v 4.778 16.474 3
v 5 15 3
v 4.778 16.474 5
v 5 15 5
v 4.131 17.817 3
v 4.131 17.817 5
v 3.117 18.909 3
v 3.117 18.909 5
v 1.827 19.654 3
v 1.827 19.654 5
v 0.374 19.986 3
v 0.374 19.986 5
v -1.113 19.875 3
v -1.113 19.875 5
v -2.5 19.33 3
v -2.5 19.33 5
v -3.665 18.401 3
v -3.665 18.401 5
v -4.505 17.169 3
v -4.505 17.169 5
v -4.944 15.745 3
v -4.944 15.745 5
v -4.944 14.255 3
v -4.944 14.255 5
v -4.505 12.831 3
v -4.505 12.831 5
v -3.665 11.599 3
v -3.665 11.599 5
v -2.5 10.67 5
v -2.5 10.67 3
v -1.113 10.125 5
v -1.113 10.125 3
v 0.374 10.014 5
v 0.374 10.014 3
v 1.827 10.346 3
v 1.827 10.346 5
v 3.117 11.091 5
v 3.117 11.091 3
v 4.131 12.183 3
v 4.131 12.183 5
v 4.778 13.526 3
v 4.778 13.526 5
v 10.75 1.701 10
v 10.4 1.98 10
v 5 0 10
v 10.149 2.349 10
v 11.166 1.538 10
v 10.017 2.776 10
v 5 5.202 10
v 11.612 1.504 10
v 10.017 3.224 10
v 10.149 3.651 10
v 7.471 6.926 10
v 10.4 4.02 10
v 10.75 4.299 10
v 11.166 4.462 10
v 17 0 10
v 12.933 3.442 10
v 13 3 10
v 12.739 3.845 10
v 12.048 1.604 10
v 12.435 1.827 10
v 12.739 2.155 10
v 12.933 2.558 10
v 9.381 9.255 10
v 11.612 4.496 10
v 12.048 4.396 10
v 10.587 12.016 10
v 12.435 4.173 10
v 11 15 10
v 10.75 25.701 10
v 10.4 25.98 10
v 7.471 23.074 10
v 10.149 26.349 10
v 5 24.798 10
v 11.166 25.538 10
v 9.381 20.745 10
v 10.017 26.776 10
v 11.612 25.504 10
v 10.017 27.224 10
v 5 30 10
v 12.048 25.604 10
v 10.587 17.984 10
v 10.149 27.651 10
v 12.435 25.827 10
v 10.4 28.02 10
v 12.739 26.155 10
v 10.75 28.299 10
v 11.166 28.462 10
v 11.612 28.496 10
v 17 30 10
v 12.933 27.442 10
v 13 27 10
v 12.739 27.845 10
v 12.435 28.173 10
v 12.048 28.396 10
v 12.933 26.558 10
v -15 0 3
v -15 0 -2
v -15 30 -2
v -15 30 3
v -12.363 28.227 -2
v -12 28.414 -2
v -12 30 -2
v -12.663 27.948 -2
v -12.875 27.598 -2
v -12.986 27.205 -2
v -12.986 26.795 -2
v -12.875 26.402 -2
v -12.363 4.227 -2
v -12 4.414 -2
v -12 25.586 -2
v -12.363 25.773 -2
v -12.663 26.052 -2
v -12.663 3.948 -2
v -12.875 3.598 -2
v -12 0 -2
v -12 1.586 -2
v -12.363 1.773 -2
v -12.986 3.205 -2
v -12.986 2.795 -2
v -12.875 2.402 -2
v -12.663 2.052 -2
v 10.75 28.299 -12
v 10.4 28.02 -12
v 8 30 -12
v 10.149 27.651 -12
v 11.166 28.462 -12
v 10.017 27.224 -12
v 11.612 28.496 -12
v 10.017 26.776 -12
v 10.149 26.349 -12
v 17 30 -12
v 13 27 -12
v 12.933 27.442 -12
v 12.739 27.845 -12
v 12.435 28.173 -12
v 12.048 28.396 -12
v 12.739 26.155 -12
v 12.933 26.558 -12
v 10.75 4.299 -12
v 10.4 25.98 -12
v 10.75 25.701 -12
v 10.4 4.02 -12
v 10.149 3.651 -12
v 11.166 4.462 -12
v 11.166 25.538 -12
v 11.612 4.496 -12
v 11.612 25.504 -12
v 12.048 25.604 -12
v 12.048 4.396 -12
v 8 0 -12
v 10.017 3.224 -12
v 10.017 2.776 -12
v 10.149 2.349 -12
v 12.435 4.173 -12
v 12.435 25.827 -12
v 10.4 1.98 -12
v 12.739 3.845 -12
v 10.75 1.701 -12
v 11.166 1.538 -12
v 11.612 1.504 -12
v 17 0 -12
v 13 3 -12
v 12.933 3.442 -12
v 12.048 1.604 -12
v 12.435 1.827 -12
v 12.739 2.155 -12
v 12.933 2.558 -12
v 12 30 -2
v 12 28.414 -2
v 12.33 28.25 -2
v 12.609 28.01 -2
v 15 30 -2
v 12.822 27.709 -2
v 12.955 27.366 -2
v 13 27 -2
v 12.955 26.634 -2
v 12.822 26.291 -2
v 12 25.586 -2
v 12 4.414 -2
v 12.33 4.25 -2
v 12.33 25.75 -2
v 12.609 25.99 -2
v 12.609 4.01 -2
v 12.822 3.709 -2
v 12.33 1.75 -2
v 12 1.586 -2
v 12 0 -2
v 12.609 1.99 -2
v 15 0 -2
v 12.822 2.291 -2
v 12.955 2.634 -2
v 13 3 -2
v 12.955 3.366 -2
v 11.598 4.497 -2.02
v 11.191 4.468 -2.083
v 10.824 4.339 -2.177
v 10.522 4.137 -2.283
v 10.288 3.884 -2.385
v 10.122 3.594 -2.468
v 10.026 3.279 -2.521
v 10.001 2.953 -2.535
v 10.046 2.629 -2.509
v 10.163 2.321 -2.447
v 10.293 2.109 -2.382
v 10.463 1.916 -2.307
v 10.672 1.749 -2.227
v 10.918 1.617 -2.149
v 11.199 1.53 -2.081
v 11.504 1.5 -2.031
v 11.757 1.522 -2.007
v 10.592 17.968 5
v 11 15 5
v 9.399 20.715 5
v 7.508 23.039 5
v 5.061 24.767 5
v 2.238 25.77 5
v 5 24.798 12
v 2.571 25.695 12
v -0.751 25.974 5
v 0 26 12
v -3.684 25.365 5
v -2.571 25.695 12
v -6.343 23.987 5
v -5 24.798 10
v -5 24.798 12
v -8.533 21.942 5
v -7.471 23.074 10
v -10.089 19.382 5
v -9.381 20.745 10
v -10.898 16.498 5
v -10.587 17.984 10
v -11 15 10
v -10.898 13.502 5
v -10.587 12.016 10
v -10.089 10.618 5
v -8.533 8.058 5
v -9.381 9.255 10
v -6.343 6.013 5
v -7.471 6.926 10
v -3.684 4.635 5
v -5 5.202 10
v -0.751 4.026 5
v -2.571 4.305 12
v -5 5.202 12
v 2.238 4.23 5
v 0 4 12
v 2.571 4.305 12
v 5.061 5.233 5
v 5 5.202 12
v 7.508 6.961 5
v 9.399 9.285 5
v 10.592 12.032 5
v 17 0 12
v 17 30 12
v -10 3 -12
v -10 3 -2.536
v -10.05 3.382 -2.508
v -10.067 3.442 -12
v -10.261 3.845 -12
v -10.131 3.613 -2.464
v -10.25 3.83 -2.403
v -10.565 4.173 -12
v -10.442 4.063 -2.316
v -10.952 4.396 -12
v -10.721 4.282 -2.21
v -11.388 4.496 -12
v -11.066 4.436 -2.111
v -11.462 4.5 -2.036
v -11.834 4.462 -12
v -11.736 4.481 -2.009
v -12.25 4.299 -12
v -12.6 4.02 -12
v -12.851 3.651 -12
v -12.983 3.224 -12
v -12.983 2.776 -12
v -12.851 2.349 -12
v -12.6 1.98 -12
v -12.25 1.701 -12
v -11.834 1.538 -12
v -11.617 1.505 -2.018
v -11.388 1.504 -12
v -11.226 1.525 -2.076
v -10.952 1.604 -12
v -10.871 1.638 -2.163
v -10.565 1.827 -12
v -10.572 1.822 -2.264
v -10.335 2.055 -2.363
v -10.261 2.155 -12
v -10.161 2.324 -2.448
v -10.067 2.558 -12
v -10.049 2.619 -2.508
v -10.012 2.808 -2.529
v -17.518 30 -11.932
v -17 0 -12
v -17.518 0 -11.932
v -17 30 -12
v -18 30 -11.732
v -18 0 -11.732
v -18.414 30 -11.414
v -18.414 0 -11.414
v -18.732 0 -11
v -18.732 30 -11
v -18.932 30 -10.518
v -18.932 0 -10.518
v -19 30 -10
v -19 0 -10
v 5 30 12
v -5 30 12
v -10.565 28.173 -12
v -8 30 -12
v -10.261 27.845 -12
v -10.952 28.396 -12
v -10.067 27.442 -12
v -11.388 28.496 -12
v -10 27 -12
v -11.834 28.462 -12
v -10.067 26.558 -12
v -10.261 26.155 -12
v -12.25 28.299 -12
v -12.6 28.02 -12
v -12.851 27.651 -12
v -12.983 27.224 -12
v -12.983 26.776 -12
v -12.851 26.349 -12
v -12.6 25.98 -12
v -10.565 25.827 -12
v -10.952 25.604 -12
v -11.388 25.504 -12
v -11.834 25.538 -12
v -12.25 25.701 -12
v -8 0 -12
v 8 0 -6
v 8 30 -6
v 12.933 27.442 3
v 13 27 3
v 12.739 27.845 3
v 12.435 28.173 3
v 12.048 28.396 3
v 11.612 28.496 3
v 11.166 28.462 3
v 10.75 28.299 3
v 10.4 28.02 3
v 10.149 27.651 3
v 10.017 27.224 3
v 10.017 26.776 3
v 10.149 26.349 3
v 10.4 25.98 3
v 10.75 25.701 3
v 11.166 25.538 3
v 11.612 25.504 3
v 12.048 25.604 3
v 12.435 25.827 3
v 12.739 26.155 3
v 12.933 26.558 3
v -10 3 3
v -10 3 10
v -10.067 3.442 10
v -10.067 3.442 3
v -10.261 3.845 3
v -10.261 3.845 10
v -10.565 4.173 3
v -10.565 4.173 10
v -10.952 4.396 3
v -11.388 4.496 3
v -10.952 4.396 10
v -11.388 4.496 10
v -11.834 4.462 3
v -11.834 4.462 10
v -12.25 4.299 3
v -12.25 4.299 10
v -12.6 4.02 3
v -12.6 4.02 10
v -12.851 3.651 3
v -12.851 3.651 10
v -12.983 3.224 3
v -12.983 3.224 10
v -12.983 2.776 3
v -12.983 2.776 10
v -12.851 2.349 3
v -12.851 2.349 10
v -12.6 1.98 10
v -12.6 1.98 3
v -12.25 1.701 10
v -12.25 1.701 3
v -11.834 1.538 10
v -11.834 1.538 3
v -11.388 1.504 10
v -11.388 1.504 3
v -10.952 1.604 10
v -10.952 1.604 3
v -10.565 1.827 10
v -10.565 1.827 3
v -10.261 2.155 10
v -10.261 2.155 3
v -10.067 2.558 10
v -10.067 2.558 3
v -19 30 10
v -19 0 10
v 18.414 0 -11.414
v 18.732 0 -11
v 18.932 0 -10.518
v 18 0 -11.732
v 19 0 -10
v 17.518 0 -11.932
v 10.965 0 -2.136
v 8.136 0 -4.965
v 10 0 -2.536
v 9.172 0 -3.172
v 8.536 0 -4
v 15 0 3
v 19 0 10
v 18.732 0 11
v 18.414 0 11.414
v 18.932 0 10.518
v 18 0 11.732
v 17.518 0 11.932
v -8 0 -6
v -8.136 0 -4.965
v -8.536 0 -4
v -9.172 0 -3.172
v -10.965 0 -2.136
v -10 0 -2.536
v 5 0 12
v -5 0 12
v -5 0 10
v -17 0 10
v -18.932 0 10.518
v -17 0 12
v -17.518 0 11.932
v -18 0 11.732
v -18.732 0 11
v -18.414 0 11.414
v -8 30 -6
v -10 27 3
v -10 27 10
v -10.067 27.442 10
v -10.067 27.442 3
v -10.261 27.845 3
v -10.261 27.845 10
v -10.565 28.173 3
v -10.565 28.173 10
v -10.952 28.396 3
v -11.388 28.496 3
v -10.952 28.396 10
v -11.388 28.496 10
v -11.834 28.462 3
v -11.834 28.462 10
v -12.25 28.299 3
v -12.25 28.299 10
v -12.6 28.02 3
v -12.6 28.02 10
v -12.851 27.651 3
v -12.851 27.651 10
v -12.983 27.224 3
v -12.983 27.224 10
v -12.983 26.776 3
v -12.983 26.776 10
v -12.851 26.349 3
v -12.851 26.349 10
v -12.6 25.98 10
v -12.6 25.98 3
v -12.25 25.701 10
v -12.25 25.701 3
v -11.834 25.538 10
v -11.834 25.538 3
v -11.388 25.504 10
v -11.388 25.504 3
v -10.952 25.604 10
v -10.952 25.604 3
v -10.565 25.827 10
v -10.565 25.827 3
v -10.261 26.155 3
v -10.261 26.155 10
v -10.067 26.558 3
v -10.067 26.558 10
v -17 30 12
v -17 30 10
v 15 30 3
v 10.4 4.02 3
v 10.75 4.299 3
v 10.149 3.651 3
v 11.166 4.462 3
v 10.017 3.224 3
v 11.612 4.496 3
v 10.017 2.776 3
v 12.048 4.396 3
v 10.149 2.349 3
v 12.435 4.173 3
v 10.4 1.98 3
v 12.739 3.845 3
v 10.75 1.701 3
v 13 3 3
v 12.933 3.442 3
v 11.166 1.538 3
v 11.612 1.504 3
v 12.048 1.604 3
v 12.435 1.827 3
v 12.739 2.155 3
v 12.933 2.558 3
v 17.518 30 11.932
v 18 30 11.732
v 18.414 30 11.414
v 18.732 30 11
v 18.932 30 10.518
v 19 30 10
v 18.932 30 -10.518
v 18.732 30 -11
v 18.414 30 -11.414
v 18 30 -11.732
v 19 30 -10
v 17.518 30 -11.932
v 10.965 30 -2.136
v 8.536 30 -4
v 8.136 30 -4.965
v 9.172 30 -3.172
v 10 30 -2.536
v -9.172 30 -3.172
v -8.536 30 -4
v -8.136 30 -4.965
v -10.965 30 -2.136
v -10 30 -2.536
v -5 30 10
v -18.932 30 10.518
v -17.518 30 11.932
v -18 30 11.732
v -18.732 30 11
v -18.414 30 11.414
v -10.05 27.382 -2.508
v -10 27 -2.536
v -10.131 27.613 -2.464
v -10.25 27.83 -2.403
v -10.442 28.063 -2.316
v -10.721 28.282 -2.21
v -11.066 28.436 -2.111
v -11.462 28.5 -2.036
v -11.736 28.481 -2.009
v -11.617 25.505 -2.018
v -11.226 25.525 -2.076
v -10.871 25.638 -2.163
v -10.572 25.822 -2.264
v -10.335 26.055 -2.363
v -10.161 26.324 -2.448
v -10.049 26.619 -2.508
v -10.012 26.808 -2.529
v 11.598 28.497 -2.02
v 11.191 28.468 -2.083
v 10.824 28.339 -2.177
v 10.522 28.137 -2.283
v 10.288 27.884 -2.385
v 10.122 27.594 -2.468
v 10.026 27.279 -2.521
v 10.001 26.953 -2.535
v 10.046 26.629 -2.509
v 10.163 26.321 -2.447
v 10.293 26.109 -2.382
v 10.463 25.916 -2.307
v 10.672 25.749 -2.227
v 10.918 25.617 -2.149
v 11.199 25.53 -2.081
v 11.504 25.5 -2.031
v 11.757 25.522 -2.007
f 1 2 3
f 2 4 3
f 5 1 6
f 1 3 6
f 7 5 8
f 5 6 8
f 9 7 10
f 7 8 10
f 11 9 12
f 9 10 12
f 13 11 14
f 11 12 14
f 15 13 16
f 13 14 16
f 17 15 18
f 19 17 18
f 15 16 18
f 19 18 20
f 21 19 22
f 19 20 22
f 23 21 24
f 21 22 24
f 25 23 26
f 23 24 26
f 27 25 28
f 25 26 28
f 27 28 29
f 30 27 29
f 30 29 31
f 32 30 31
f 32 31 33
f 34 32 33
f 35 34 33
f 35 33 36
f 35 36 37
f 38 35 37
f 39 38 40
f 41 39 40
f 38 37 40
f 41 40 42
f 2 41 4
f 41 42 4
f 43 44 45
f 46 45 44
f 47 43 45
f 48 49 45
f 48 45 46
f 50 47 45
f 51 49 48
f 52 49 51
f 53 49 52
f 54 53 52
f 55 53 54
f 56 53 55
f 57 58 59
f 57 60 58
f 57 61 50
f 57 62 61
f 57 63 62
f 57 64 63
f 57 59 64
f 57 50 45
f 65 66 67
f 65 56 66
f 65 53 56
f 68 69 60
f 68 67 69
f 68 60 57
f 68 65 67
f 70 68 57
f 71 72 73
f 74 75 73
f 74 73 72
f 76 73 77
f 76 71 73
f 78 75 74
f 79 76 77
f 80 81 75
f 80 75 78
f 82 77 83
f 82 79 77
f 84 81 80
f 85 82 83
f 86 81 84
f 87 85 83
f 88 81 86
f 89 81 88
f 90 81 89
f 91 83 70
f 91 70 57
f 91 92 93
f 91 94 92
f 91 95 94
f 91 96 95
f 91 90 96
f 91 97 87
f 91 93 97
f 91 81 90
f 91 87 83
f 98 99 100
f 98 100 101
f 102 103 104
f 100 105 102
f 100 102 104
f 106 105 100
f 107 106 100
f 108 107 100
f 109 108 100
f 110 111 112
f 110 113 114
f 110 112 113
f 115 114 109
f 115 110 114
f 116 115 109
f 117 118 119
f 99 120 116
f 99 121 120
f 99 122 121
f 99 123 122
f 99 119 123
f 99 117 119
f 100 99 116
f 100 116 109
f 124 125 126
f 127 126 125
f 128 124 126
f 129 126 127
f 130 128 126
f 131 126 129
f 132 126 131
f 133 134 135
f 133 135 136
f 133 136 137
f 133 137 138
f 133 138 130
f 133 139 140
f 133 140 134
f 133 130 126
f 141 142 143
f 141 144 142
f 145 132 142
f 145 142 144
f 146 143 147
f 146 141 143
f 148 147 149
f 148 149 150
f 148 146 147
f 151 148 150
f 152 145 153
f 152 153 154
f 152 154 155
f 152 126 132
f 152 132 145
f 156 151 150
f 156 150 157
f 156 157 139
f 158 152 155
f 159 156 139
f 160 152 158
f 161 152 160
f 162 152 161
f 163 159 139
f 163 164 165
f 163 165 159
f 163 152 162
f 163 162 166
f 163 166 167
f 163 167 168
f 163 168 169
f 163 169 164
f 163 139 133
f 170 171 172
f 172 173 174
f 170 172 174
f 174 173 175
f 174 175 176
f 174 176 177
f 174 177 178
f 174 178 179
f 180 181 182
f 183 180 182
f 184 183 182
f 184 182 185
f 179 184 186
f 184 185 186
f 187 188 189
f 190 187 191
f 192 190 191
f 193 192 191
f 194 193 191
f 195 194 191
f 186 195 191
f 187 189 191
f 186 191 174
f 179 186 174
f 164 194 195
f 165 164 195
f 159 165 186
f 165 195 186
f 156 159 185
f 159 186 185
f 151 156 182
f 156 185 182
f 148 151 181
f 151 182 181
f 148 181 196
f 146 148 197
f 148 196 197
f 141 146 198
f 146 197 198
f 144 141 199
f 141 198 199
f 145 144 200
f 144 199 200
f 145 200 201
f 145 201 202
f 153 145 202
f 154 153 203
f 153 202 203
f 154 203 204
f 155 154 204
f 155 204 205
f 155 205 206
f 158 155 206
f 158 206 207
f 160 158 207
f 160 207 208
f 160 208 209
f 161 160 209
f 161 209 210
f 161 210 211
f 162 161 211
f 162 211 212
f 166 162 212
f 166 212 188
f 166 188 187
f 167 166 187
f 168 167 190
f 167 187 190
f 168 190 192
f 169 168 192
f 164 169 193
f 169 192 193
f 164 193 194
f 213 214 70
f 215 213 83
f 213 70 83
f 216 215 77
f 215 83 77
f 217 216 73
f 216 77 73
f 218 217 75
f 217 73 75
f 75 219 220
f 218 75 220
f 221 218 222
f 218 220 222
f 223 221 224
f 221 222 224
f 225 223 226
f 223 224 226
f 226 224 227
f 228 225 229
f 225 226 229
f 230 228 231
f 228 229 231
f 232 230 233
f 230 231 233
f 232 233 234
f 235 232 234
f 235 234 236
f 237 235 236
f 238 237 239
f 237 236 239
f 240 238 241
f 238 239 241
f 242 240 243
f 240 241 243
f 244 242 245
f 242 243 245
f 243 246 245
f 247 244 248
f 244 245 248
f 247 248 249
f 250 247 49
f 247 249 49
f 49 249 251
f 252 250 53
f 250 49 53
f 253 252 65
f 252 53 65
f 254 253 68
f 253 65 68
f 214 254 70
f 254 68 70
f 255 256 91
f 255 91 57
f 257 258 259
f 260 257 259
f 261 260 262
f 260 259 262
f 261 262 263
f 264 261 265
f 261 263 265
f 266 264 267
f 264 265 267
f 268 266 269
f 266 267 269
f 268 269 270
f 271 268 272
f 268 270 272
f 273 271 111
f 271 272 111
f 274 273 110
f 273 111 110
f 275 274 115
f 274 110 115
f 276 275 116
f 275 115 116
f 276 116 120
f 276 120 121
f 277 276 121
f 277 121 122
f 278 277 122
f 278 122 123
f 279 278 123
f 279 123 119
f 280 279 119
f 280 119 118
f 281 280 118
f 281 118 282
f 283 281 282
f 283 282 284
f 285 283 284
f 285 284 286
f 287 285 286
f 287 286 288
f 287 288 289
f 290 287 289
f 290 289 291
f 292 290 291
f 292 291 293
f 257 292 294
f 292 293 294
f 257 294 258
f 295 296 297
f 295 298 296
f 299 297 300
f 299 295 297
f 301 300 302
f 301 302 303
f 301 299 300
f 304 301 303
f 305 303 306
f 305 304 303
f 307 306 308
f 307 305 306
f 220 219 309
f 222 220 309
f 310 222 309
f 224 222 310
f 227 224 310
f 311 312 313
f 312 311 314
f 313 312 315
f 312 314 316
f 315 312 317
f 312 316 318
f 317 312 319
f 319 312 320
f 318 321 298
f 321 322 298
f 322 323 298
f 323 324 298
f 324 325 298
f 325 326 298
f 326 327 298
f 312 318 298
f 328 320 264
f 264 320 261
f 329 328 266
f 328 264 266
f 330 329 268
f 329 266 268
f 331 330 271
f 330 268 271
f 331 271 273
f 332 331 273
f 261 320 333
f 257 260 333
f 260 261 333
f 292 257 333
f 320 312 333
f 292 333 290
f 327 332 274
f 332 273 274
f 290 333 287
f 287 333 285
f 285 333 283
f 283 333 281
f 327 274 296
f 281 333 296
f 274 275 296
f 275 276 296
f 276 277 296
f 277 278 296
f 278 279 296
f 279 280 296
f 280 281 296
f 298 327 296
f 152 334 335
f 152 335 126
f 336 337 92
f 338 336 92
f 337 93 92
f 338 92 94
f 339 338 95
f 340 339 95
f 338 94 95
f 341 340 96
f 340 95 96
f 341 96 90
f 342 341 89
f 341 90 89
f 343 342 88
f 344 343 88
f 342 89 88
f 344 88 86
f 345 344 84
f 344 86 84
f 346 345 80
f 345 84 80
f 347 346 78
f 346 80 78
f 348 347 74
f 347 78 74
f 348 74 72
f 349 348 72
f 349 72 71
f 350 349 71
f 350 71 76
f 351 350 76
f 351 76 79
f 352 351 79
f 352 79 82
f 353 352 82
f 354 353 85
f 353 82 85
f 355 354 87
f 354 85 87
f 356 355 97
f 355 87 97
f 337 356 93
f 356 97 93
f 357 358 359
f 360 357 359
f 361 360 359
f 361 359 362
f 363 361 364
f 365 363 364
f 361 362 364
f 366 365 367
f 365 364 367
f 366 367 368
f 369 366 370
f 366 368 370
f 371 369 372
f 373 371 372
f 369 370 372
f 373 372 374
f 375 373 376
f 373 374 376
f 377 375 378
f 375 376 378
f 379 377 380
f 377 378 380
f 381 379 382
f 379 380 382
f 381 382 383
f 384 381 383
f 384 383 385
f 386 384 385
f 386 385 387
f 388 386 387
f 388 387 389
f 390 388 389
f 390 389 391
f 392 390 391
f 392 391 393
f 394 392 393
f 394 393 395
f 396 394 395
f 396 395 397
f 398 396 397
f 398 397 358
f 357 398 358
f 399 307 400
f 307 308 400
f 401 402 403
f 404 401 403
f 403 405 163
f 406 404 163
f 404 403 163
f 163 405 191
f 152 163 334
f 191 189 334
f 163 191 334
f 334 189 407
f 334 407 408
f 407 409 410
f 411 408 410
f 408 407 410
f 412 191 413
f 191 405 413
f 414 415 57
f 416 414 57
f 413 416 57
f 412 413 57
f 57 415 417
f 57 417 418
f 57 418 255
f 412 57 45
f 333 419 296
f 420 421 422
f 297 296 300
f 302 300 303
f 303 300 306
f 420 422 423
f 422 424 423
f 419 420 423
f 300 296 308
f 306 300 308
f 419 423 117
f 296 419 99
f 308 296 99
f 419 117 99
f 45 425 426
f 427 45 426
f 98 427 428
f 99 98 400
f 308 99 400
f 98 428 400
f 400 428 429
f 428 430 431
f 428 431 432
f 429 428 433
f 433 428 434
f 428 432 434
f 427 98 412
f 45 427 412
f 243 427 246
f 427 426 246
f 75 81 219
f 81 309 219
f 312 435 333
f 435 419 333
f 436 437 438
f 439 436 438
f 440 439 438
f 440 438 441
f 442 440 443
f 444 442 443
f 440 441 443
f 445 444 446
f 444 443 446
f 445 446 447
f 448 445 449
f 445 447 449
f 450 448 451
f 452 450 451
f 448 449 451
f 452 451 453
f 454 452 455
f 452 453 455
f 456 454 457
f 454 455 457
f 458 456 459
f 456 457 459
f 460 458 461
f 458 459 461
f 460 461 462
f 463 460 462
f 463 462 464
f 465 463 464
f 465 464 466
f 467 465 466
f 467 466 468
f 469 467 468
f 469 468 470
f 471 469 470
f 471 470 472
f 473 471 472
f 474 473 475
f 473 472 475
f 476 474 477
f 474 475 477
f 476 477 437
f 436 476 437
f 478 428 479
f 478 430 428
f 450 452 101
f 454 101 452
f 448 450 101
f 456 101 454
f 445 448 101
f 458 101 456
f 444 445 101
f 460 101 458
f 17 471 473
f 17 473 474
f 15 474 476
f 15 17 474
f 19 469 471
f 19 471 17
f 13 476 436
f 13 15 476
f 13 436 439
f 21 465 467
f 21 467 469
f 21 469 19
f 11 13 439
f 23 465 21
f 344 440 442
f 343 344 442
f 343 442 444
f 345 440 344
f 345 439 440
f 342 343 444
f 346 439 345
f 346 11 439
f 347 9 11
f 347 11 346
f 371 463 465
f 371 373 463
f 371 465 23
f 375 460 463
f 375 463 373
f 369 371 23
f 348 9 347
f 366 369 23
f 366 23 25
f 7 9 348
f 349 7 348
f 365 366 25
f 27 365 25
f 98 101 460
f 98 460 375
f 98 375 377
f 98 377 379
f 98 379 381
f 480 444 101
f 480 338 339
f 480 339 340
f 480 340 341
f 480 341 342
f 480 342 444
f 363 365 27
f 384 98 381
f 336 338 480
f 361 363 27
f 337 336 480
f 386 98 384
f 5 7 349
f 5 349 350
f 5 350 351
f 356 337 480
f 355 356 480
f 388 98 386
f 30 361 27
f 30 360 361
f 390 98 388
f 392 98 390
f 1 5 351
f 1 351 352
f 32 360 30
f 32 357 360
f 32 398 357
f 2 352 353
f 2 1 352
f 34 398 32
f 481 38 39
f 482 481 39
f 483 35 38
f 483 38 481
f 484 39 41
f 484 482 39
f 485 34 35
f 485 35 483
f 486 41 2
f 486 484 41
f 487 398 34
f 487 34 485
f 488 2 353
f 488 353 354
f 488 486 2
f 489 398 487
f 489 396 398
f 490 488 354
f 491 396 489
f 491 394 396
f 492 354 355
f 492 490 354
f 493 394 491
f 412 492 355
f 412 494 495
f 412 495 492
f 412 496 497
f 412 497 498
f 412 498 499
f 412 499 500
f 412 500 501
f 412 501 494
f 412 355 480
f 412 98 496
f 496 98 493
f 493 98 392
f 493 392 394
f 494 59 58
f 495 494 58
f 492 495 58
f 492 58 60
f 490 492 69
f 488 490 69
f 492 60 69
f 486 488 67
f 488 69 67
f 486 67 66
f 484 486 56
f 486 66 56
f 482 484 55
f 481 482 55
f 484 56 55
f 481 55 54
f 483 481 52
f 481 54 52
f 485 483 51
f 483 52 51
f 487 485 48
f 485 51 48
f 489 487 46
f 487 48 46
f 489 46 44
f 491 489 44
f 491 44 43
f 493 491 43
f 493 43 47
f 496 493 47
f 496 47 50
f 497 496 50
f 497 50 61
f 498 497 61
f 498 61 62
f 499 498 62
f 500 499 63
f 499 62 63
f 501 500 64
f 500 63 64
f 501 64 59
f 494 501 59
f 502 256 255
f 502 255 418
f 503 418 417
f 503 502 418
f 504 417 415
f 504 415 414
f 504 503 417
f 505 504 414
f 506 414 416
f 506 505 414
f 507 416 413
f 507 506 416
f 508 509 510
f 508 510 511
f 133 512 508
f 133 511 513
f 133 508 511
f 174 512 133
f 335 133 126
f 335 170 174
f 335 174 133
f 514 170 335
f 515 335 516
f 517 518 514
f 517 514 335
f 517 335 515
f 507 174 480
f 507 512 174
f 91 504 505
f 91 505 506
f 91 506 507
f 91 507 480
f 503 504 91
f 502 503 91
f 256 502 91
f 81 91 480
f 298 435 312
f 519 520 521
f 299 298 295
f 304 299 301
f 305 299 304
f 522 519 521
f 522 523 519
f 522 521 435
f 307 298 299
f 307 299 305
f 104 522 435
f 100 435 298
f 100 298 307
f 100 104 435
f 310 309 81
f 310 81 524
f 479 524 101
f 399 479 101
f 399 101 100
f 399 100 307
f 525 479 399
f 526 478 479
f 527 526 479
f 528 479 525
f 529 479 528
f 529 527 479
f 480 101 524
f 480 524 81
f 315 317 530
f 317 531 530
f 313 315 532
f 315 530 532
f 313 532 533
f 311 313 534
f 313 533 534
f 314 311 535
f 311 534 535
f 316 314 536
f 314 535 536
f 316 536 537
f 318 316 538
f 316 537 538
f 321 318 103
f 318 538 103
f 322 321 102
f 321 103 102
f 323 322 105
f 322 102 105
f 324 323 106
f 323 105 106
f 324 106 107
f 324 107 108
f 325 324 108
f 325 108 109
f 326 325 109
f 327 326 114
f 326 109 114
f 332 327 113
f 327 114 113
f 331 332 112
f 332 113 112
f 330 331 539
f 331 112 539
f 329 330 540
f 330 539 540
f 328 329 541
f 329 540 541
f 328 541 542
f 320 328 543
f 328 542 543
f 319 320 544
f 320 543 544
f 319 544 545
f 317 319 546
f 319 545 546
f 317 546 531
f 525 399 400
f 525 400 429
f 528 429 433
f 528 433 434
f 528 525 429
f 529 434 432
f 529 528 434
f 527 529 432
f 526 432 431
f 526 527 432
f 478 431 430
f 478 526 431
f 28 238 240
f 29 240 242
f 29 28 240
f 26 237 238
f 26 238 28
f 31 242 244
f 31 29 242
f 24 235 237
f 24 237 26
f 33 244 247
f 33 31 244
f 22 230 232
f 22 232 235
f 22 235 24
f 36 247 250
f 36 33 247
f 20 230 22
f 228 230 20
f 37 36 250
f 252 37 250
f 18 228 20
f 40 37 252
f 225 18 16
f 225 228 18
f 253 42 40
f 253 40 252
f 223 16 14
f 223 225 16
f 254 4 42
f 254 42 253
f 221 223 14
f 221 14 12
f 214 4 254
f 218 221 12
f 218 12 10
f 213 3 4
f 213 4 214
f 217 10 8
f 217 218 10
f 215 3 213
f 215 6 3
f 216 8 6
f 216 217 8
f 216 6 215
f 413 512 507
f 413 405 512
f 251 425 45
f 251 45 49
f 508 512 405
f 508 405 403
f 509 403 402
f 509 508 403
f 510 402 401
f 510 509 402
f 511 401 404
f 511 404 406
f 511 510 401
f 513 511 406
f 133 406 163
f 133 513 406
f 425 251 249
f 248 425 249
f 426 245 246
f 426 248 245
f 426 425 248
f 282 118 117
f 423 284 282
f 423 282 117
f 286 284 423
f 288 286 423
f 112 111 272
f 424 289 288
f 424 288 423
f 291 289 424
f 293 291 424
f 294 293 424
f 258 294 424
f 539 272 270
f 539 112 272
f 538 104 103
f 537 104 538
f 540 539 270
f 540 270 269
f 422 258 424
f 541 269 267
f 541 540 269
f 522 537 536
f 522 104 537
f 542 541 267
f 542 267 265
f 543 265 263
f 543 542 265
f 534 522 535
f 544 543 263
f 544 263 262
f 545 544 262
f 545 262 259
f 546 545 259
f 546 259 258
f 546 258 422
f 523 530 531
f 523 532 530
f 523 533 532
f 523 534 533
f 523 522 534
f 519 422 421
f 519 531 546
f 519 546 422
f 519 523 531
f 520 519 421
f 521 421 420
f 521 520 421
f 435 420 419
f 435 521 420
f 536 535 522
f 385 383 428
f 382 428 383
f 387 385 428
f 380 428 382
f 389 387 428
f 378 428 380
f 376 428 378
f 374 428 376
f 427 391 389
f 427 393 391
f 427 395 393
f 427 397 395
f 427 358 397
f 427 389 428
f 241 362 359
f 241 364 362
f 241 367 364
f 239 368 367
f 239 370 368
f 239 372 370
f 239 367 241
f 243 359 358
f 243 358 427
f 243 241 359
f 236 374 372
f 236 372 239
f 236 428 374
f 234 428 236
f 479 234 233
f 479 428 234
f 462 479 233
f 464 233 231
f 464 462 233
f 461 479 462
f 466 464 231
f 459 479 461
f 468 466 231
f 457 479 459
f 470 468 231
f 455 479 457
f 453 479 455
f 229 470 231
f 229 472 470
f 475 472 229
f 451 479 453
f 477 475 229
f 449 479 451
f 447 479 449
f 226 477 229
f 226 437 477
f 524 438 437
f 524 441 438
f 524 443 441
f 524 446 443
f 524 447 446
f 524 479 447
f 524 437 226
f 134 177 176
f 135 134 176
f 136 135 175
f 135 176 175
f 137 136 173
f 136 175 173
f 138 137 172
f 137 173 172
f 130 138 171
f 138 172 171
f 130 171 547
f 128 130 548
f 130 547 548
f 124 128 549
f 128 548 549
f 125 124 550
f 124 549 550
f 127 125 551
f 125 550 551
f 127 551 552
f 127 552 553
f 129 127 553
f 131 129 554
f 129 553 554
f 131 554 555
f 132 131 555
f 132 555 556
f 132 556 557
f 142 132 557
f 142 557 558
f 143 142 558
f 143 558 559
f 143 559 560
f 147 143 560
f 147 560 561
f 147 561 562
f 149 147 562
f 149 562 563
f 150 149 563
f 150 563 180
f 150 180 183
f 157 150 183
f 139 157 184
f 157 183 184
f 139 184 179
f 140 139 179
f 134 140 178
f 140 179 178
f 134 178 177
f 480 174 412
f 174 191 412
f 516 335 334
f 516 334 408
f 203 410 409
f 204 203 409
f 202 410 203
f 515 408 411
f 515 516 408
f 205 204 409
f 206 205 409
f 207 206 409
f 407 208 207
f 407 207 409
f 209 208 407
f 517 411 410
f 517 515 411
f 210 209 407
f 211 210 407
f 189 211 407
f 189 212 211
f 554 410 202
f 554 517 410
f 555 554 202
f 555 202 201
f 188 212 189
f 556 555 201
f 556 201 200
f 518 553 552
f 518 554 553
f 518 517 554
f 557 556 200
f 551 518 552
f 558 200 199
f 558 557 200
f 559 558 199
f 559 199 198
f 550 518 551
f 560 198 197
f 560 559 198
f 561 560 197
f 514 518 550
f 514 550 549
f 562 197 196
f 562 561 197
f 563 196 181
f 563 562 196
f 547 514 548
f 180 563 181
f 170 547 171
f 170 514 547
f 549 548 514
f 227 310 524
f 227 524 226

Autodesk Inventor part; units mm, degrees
ref_plane "YZ Plane" through (0, 0, 0) normal (1, 0, 0) x (0, 1, 0)
ref_plane "XZ Plane" through (0, 0, 0) normal (0, 1, 0) x (-1, 0, 0)
ref_plane "XY Plane" through (0, 0, 0) normal (0, 0, 1) x (1, 0, 0)
sketch "Sketch1" plane through (0, 0, 0) normal (0, 1, 0) x (-1, 0, 0)
  line L0 (0, -37.4557) -> (0, 23.9689) construction
  line L1 (8, -2) -> (8, -12)
  line L2 (8, -12) -> (19, -12)
  line L3 (19, -12) -> (19, 12)
  line L4 (19, 12) -> (2, 12)
  line L5 (8, -2) -> (15, -2)
  line L6 (15, -2) -> (15, 3)
  line L7 (15, 3) -> (0, 3)
  line L8 (0, -49.7407) -> (0, 36.2538) projected
  line L9 (-8, -2) -> (-8, -12)
  line L10 (-8, -12) -> (-19, -12)
  line L11 (-19, -12) -> (-19, 12)
  line L12 (-19, 12) -> (2, 12)
  line L13 (-8, -2) -> (-15, -2)
  line L14 (-15, -2) -> (-15, 3)
  line L15 (-15, 3) -> (0, 3)
  line L16 (26.6, 0) -> (-26.6, 0) projected
  point P0 (19, 0)
  point P1 (-19, 0)
  dimension "d12" = 15
  dimension "d13" = 5
  dimension "d14" = 7
  dimension "d15" = 10
  dimension "d16" = 11
  dimension "d18" = 9
  dimension "d19" = 17
extrude "Extrusion1" add sketch "Sketch1" along normal blind 30 contours L5 L6 L16 L3 L2 L1 | L6 L7 L8 L12 L4 L3 L16 | L15 L14 L16 L11 L12 L8 | L14 L13 L9 L10 L11 L16
fillet "Fillet1" radius 4 2 edges at (-8, 15, -2) (8, 15, -2)
sketch "Sketch2" plane through (-19, 0, 12) normal (0, 0, 1) x (1, 0, 0)
  line L0 (0, 0) -> (38, 0) projected
  line L1 (38, 0) -> (38, 30) projected
  line L2 (0, 30) -> (38, 30) projected
  line L3 (0, 0) -> (0, 30) projected
  line L4 (38, 0) -> (38, 30) projected
  line L5 (38, 15) -> (0, 15) construction
  line L6 (0, 0) -> (0, 30) projected
  circle A0 centre (19, 15) radius 11
  circle A1 centre (19, 15) radius 5
  line L7 (0, 0) -> (38, 0) projected
  line L8 (7, 30) -> (7, 0) projected
  line L9 (4, 30) -> (7, 30) projected
  line L10 (4, 0) -> (4, 30) projected
  line L11 (4, 0) -> (7, 0) projected
  line L12 (31, 0) -> (31, 30) projected
  line L13 (31, 0) -> (34, 0) projected
  line L14 (34, 0) -> (34, 30) projected
  line L15 (31, 30) -> (34, 30) projected
  circle A2 centre (30.5, 27) radius 1.5
  line L16 (19, 15) -> (19, 38.5815) construction
  circle A3 centre (7.5, 27) radius 1.5
  circle A4 centre (30.5, 3) radius 1.5
  circle A5 centre (7.5, 3) radius 1.5
  point P0 (19, 0)
  dimension "d23" = 22
  dimension "d24" = 10
  dimension "d25" = 3
  dimension "d26" = 11.5
  dimension "d27" = 12
extrude "Extrusion2" cut sketch "Sketch2" against normal blind 7 contours A0
extrude "Extrusion3" cut sketch "Sketch2" against normal through all contours A5 L8 | L8 A5 | A4 L12 | L12 A4 | A3 L8 | L8 A3 | A2 L12 | L12 A2 | A1
fillet "Fillet2" radius 2 4 edges at (19, 15, 12) (-19, 15, 12) (-19, 15, -12) (19, 15, -12)
sketch "Boceto4" plane through (-17, 0, 12) normal (0, 0, 1) x (1, 0, 0)
  circle A0 centre (17, 15) radius 5 projected
  line L0 (0, 0) -> (0, 30) projected
  line L1 (34, 30) -> (34, 0) projected
  line L2 (0, 0) -> (34, 0) projected
  line L3 (32, 30) -> (2, 30) projected
  line L4 (12, 30) -> (12, 24.798)
  circle A1 centre (17, 15) radius 11 projected
  line L5 (22, 30) -> (22, 24.798)
  circle A2 centre (17, 15) radius 5 construction
  line L6 (17, 15) -> (17, 30) construction
  line L7 (32, 0) -> (2, 0) construction
  line L8 (12, 0) -> (12, 5.202)
  line L9 (22, 0) -> (22, 5.202)
  circle A3 centre (17, 15) radius 11 projected
  line L10 (0, 30) -> (34, 30) projected
  circle A4 centre (5.5, 3) radius 1.5 projected
  circle A5 centre (28.5, 27) radius 1.5 projected
  circle A6 centre (5.5, 27) radius 1.5 projected
  circle A7 centre (28.5, 3) radius 1.5 projected
  line L11 (0, 0) -> (0, 30) projected
  line L12 (0, 0) -> (34, 0) projected
  line L13 (34, 30) -> (34, 0) projected
  line L14 (0, 30) -> (34, 30) projected
  circle A8 centre (17, 15) radius 11 projected
  circle A9 centre (28.5, 27) radius 1.5 projected
  circle A10 centre (5.5, 3) radius 1.5 projected
  circle A11 centre (28.5, 3) radius 1.5 projected
  point P0 (17, 0)
  dimension "d44" = 5
  dimension "d45" = 5
extrude "Extrusión5" cut sketch "Boceto4" against normal blind 2 contours L0 L10 L3 L4 A1 L8 L2 | L9 A1 L5 L3 L10 L1 L2
equation "\"d45\" = d44"
properties part number "Tensor" material "Plástico PBT"
